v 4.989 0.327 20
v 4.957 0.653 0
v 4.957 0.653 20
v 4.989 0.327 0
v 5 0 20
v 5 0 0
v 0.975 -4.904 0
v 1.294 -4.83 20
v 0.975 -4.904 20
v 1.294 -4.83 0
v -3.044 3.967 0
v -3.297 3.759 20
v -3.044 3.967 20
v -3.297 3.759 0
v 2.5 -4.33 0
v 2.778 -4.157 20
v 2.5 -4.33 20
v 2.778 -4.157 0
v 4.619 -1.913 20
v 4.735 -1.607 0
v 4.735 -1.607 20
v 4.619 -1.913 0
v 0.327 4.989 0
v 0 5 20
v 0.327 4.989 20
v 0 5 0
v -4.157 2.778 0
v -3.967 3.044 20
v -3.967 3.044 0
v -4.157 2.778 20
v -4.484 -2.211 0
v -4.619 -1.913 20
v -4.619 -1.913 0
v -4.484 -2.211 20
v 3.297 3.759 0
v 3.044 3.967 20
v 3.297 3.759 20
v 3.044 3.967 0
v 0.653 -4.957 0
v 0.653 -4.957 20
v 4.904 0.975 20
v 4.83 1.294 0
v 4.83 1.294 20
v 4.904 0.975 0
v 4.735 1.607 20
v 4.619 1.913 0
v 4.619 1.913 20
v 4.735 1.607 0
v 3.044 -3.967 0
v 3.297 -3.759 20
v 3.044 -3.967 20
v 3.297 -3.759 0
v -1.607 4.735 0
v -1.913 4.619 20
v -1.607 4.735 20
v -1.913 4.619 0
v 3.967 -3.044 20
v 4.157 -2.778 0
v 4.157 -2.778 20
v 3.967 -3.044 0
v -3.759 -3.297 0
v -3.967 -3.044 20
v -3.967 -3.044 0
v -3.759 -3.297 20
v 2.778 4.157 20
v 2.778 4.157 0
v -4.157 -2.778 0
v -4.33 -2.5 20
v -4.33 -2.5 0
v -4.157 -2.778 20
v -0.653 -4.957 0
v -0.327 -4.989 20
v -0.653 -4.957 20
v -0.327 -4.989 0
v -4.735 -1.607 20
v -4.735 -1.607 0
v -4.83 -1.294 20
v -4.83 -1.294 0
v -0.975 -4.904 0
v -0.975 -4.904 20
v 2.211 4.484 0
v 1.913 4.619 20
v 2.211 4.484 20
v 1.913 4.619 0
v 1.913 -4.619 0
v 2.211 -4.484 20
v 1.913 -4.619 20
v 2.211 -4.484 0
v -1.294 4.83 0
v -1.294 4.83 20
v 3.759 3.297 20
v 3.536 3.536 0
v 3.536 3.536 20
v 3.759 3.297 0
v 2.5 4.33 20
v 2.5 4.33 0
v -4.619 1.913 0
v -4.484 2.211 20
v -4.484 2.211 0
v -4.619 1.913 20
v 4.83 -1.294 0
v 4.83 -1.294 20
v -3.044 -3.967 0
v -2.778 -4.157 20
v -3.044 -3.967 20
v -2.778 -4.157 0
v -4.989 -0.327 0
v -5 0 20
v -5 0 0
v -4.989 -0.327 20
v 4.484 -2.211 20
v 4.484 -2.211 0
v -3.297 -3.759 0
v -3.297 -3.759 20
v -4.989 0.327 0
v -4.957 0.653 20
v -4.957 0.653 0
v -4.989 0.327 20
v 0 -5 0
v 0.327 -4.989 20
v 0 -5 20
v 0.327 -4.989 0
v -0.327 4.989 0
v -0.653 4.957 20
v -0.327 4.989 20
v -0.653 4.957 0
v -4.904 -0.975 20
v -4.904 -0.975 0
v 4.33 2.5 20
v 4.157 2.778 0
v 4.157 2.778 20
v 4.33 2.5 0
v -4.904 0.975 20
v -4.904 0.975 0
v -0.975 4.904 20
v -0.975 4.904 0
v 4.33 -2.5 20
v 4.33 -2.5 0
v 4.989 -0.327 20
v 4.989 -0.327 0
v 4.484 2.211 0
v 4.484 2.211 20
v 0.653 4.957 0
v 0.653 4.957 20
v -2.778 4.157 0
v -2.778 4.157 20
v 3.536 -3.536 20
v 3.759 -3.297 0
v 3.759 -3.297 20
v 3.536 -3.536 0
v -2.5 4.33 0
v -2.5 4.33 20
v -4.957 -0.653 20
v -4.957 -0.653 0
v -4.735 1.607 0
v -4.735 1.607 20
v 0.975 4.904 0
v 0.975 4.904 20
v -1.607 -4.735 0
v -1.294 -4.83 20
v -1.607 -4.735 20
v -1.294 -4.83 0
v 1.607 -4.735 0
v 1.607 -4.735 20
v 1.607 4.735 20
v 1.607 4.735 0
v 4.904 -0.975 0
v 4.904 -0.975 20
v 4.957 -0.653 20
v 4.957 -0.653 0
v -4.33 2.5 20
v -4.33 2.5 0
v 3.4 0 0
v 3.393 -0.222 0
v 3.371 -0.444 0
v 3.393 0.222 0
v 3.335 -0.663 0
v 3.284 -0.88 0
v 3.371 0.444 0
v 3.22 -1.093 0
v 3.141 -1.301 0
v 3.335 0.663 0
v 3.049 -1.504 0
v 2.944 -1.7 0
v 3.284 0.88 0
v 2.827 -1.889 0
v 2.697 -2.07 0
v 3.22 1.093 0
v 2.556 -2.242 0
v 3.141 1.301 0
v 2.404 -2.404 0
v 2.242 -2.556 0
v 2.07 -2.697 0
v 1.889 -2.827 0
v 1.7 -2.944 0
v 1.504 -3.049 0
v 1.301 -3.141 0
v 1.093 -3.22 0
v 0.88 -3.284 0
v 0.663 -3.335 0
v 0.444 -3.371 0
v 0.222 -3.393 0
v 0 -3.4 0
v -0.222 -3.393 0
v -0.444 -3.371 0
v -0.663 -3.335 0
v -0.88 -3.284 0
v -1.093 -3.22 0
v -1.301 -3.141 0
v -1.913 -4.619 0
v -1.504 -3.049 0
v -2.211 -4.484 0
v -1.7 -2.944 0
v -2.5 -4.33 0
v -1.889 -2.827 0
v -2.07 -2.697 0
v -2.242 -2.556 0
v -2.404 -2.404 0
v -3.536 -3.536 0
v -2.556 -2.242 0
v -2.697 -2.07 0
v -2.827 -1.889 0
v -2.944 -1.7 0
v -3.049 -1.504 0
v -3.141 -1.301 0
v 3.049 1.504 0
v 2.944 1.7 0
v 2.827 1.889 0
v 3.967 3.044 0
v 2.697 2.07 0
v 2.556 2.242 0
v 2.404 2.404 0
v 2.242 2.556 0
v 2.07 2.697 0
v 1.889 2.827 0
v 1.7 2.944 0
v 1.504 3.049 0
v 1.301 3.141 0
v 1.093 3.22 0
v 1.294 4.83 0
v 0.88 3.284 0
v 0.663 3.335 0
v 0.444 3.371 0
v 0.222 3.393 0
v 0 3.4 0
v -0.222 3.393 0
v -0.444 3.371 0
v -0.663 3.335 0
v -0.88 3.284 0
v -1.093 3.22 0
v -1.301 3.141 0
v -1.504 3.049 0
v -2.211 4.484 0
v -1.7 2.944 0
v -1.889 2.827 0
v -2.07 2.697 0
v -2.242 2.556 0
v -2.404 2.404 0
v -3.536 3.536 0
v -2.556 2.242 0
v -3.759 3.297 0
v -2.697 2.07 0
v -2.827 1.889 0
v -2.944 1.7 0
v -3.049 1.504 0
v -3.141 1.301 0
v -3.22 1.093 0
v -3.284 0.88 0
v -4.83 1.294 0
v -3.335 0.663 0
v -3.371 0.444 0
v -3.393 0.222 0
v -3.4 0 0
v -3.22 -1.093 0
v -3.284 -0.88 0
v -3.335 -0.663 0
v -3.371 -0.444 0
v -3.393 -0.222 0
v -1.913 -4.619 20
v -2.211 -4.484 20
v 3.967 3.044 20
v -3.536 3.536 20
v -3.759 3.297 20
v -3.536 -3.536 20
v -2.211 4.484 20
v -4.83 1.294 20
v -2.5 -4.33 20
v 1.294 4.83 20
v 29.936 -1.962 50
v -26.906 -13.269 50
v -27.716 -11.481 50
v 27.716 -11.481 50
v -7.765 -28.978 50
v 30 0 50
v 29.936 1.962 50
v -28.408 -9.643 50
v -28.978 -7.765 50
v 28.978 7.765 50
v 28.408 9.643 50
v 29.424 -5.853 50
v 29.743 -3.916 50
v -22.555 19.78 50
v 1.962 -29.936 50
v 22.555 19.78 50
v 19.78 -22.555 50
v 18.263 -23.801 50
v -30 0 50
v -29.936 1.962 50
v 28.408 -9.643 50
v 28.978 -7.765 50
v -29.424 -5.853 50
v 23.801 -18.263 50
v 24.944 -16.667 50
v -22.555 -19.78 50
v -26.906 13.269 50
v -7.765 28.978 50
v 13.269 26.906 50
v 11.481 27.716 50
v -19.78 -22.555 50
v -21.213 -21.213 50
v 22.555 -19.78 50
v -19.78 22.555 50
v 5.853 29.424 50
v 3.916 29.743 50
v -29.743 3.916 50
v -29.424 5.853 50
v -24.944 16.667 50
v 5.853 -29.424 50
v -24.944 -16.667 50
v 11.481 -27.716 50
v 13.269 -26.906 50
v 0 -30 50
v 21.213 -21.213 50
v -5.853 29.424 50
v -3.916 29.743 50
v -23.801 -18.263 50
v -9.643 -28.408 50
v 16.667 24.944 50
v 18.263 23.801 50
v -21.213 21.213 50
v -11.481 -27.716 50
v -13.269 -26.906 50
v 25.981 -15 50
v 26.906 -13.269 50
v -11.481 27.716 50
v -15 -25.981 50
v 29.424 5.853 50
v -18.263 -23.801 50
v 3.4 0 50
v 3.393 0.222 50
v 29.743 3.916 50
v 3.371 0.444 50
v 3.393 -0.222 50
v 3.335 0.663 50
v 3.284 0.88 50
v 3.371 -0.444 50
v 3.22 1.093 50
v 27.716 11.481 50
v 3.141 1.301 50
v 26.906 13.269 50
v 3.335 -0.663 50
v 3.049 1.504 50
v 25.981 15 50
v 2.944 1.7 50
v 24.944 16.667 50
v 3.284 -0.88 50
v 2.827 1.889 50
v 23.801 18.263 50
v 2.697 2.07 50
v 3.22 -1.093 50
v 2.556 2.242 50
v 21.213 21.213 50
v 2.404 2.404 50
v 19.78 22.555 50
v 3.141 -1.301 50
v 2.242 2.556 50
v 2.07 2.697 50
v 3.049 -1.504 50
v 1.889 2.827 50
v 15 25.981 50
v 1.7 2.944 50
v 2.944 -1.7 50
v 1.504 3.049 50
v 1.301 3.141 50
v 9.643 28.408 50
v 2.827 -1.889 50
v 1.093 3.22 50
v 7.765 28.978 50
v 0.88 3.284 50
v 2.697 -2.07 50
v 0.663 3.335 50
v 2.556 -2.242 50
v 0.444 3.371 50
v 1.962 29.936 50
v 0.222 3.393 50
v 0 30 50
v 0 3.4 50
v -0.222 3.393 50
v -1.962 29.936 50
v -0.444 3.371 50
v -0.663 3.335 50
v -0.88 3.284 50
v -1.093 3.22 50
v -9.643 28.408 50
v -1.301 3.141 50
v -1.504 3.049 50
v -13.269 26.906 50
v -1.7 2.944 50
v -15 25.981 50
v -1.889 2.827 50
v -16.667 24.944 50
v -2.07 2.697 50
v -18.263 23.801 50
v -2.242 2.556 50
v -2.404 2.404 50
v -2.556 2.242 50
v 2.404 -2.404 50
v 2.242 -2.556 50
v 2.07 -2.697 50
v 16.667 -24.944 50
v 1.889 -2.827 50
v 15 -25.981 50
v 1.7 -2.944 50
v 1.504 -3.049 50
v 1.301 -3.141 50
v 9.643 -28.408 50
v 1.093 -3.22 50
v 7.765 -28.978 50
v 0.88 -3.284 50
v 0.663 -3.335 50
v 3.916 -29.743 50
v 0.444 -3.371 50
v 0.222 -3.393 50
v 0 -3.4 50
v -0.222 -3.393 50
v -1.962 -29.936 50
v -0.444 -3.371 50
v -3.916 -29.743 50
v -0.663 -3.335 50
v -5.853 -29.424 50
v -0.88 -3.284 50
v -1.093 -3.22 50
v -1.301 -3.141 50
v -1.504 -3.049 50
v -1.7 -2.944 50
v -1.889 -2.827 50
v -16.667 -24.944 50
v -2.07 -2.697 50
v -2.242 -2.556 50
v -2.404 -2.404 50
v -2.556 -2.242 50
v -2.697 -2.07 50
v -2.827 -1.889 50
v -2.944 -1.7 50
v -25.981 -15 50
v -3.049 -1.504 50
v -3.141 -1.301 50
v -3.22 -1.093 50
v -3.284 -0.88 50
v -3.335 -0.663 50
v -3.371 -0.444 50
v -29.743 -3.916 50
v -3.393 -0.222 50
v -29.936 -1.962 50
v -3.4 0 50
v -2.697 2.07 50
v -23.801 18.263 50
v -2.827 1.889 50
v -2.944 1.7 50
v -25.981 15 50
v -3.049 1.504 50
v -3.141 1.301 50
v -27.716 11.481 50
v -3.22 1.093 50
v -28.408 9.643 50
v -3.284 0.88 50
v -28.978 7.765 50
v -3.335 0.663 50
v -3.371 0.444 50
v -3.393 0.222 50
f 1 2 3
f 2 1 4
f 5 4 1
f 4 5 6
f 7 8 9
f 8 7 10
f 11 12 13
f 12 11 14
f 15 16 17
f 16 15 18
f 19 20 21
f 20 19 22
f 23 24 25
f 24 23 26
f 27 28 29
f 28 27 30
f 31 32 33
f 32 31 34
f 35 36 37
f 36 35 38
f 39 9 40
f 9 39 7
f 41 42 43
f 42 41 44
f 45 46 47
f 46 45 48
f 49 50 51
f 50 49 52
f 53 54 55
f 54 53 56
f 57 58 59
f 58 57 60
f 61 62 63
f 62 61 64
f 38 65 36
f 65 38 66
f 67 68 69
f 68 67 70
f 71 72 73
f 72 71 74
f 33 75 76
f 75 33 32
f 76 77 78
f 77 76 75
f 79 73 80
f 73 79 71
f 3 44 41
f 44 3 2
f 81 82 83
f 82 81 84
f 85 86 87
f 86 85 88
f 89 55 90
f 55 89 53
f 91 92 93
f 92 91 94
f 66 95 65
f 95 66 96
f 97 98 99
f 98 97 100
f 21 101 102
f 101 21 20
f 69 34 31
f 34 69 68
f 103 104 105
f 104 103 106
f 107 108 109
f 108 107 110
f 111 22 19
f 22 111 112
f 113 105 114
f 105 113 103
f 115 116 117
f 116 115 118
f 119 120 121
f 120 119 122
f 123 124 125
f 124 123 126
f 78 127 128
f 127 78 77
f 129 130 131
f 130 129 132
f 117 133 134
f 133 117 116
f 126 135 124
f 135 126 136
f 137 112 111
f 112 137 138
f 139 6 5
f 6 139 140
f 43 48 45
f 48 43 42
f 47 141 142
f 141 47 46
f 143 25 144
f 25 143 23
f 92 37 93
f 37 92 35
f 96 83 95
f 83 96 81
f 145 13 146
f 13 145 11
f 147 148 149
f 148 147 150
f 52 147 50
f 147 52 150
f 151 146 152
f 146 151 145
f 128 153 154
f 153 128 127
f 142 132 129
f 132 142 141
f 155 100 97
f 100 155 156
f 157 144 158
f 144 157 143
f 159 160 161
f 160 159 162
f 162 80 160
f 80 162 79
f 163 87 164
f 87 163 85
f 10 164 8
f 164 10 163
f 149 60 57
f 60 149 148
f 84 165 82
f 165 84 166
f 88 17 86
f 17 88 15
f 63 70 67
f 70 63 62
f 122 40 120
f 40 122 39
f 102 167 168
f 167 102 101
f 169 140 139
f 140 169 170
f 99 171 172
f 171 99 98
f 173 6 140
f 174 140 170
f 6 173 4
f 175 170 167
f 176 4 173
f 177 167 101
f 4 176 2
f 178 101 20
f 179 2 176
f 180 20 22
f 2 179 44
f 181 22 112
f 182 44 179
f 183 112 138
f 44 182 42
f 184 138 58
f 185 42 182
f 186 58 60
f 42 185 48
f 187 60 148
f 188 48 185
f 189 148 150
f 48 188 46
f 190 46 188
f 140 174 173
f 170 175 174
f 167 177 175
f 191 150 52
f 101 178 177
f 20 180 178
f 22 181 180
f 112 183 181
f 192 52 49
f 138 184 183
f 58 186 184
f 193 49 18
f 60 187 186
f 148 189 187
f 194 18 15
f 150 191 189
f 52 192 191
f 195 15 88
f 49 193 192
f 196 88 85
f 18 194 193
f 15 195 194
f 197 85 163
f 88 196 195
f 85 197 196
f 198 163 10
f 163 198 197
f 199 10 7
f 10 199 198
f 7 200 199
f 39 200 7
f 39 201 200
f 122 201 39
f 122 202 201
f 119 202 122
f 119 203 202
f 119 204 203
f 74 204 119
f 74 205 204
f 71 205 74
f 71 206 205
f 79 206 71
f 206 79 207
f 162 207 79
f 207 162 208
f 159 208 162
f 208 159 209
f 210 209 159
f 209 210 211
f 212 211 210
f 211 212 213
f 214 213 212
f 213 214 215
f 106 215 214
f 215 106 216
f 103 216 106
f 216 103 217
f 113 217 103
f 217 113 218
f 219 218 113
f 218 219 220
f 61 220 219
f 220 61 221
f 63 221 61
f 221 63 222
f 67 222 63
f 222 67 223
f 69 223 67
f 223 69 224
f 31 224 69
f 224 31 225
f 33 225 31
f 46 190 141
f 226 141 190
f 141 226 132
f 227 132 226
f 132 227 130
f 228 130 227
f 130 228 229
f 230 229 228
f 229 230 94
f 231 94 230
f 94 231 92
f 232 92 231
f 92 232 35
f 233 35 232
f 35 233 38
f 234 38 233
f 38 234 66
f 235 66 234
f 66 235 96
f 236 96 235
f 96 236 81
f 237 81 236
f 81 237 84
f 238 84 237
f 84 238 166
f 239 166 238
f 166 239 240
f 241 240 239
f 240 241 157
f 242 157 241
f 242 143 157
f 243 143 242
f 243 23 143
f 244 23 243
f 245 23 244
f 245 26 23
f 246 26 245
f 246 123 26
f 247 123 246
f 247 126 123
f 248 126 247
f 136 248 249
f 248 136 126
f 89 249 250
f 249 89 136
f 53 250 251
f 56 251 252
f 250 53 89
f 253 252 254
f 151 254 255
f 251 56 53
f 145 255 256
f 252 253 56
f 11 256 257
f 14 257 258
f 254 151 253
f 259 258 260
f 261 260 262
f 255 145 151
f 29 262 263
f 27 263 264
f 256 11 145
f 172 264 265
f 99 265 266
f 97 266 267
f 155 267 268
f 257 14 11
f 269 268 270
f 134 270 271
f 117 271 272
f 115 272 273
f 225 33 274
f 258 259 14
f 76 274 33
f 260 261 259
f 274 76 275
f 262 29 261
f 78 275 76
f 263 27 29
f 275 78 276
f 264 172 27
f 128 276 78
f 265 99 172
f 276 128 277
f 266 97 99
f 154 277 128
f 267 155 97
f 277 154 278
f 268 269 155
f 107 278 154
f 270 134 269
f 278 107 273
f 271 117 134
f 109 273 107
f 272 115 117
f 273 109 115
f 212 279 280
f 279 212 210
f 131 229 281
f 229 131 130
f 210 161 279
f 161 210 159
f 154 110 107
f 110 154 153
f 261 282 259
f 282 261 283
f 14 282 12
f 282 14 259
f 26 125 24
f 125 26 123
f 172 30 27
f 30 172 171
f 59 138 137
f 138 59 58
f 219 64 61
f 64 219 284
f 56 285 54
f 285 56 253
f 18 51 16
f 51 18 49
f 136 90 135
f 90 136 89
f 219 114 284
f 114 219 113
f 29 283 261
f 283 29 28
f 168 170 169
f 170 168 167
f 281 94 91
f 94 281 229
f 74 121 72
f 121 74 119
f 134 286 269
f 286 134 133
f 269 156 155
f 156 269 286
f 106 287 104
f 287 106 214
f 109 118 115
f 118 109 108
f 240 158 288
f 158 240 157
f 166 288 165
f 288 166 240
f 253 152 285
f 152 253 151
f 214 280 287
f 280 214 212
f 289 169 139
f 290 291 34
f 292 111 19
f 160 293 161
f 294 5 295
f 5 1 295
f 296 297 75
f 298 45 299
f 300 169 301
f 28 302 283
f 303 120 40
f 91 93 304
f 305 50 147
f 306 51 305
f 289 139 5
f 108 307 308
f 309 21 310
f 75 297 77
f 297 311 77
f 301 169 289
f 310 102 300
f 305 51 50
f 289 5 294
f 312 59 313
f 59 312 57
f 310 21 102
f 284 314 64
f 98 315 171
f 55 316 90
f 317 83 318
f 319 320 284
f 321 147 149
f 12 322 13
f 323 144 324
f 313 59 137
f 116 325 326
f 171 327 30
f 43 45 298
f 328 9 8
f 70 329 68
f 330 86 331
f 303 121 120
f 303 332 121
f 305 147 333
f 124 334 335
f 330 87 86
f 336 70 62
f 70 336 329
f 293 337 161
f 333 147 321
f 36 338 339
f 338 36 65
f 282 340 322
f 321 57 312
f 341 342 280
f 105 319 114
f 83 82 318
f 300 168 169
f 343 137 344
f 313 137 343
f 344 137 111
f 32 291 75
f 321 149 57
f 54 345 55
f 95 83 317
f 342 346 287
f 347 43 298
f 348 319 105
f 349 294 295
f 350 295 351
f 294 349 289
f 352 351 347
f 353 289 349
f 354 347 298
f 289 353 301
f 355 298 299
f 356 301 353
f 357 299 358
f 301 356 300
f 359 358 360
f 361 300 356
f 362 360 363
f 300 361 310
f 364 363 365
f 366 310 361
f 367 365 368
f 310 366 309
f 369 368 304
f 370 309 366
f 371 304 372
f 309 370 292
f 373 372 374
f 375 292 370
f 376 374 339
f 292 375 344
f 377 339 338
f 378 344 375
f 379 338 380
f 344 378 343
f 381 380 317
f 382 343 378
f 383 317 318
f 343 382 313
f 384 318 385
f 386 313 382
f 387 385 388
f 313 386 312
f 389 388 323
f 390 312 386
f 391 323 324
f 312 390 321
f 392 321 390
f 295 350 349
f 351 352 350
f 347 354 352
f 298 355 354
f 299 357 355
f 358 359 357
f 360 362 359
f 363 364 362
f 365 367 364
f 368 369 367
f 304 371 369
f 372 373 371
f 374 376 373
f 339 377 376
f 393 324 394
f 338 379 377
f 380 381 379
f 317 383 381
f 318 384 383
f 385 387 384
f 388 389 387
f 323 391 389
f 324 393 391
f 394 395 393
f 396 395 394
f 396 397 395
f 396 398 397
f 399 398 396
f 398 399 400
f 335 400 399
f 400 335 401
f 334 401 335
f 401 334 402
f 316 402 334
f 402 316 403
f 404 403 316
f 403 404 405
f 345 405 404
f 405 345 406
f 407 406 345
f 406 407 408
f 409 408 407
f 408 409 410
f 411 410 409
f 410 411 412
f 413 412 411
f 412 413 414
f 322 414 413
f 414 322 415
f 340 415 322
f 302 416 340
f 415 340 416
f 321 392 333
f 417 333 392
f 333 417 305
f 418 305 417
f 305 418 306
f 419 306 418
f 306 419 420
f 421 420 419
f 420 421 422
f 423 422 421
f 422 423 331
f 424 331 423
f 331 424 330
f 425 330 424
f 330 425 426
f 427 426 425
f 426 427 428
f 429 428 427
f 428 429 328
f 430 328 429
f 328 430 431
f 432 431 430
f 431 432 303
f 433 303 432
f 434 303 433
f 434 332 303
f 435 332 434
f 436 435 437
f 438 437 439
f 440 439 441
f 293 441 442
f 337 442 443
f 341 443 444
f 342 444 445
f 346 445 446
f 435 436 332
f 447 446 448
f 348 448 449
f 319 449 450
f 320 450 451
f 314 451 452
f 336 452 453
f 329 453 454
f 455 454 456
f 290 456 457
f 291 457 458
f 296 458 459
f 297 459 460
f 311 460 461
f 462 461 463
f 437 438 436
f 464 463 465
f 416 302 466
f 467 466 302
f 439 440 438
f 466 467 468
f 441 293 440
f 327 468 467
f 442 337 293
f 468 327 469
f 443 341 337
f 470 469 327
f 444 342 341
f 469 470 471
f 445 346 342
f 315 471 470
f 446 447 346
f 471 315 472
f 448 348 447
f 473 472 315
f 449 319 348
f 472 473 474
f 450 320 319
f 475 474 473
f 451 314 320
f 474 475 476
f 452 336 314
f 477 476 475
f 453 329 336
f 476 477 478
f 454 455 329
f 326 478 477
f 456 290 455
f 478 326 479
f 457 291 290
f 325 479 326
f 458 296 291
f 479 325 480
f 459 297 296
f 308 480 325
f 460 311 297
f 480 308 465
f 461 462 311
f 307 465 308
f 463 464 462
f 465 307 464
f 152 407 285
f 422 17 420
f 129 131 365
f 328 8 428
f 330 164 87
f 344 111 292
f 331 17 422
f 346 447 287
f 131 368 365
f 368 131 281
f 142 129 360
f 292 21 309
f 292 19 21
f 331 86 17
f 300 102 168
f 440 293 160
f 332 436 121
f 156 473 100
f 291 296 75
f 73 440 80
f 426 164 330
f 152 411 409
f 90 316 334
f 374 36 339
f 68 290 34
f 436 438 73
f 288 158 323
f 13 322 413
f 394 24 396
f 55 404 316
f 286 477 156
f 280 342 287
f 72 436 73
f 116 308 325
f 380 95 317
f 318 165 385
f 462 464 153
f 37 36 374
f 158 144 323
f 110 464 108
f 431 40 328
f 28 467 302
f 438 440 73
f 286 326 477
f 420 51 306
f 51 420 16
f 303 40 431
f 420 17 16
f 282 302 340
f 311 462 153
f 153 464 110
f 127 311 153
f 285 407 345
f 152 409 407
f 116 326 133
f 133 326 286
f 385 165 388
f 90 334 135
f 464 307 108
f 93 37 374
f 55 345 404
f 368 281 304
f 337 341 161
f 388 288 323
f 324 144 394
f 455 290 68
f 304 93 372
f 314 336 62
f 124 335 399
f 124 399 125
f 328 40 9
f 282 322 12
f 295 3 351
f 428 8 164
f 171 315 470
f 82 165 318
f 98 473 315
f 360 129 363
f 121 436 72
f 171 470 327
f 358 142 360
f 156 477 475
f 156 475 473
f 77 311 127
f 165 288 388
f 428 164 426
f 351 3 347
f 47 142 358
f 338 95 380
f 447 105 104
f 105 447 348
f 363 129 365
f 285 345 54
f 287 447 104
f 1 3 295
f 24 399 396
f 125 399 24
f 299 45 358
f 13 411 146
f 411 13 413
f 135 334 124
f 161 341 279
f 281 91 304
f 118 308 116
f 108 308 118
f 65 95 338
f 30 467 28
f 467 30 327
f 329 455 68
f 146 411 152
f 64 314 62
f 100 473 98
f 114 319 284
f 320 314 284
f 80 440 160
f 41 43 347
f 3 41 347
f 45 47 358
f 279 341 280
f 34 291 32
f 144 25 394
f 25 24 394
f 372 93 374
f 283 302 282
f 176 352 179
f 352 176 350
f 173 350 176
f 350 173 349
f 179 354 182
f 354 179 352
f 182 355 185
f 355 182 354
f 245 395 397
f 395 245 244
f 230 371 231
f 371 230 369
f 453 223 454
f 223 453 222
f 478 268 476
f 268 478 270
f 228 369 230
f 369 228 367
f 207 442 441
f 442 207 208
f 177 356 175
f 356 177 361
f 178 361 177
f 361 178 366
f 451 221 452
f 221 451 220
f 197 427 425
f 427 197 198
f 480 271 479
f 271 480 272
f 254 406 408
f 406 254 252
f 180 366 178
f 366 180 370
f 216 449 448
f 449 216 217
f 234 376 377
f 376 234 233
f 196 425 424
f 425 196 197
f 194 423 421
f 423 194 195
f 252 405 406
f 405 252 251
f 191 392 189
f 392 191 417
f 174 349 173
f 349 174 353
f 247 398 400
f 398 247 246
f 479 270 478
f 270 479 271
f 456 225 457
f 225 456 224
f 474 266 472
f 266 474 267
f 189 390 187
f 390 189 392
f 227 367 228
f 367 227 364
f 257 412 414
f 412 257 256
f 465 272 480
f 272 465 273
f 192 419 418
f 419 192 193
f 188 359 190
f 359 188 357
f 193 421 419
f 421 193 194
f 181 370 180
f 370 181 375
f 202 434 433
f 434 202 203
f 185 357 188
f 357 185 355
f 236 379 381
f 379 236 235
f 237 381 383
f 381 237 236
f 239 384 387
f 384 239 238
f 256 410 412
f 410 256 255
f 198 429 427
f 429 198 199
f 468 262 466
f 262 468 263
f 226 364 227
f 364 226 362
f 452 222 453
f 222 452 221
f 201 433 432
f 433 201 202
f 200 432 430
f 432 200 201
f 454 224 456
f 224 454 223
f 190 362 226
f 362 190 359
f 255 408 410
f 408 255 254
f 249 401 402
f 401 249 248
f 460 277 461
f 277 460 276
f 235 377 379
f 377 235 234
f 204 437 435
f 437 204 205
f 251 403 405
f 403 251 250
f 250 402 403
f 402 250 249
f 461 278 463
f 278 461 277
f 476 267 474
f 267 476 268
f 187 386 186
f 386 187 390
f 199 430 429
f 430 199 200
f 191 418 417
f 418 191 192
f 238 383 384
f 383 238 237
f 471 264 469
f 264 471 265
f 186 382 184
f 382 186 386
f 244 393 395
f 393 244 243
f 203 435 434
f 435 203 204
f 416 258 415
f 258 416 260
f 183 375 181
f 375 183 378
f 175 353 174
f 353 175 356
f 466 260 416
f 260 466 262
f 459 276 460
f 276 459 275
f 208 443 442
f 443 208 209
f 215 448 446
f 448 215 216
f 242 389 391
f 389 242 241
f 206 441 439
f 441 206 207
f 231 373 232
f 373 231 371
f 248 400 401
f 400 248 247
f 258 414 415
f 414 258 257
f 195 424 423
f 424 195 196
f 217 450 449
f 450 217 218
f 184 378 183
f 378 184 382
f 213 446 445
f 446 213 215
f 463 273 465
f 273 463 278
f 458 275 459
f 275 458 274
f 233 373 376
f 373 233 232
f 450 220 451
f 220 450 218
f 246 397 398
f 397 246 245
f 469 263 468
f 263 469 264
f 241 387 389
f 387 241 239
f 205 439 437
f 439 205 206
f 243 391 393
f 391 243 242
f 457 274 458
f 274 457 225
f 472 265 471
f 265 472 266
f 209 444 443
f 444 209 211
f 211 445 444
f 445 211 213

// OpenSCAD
// Funnel - a straight spout topped with a cone, open at both ends.
// Print orientation: spout pointing down, wide rim at the top.
//

// ---------- Parameters ----------
spout_d        = 10;    // spout outer diameter
spout_bore     = 6.8;   // spout bore diameter (wall 1.6 mm)
spout_length   = 20;    // spout length (z = 0 to z = 20)
cone_top_d     = 60;    // cone rim outer diameter at z = 50
cone_height    = 30;    // cone height (z = 20 to z = 50)
wall           = 1.6;   // wall thickness everywhere
eps            = 0.5;   // cutter overshoot past faces
$fn            = 96;    // curve resolution

// Derived
cone_bottom_d = spout_d;                       // cone starts at spout diameter
spout_r       = spout_d / 2;
bore_r        = spout_bore / 2;
cone_r_top    = cone_top_d / 2;
cone_r_bot    = cone_bottom_d / 2;

// ---------- Model ----------
difference() {
    union() {
        // Straight spout: z = 0 to 20
        cylinder(r = spout_r, h = spout_length);

        // Cone: z = 20 to 50, diameter grows from 10 to 60 mm
        translate([0, 0, spout_length])
            cylinder(r1 = cone_r_bot, r2 = cone_r_top, h = cone_height);
    }

    // Through-bore: a single bore runs the full length (z = 0 to 50),
    // so liquid flows straight through spout and cone.
    translate([0, 0, -eps])
        cylinder(r = bore_r, h = spout_length + cone_height + 2 * eps);
}
